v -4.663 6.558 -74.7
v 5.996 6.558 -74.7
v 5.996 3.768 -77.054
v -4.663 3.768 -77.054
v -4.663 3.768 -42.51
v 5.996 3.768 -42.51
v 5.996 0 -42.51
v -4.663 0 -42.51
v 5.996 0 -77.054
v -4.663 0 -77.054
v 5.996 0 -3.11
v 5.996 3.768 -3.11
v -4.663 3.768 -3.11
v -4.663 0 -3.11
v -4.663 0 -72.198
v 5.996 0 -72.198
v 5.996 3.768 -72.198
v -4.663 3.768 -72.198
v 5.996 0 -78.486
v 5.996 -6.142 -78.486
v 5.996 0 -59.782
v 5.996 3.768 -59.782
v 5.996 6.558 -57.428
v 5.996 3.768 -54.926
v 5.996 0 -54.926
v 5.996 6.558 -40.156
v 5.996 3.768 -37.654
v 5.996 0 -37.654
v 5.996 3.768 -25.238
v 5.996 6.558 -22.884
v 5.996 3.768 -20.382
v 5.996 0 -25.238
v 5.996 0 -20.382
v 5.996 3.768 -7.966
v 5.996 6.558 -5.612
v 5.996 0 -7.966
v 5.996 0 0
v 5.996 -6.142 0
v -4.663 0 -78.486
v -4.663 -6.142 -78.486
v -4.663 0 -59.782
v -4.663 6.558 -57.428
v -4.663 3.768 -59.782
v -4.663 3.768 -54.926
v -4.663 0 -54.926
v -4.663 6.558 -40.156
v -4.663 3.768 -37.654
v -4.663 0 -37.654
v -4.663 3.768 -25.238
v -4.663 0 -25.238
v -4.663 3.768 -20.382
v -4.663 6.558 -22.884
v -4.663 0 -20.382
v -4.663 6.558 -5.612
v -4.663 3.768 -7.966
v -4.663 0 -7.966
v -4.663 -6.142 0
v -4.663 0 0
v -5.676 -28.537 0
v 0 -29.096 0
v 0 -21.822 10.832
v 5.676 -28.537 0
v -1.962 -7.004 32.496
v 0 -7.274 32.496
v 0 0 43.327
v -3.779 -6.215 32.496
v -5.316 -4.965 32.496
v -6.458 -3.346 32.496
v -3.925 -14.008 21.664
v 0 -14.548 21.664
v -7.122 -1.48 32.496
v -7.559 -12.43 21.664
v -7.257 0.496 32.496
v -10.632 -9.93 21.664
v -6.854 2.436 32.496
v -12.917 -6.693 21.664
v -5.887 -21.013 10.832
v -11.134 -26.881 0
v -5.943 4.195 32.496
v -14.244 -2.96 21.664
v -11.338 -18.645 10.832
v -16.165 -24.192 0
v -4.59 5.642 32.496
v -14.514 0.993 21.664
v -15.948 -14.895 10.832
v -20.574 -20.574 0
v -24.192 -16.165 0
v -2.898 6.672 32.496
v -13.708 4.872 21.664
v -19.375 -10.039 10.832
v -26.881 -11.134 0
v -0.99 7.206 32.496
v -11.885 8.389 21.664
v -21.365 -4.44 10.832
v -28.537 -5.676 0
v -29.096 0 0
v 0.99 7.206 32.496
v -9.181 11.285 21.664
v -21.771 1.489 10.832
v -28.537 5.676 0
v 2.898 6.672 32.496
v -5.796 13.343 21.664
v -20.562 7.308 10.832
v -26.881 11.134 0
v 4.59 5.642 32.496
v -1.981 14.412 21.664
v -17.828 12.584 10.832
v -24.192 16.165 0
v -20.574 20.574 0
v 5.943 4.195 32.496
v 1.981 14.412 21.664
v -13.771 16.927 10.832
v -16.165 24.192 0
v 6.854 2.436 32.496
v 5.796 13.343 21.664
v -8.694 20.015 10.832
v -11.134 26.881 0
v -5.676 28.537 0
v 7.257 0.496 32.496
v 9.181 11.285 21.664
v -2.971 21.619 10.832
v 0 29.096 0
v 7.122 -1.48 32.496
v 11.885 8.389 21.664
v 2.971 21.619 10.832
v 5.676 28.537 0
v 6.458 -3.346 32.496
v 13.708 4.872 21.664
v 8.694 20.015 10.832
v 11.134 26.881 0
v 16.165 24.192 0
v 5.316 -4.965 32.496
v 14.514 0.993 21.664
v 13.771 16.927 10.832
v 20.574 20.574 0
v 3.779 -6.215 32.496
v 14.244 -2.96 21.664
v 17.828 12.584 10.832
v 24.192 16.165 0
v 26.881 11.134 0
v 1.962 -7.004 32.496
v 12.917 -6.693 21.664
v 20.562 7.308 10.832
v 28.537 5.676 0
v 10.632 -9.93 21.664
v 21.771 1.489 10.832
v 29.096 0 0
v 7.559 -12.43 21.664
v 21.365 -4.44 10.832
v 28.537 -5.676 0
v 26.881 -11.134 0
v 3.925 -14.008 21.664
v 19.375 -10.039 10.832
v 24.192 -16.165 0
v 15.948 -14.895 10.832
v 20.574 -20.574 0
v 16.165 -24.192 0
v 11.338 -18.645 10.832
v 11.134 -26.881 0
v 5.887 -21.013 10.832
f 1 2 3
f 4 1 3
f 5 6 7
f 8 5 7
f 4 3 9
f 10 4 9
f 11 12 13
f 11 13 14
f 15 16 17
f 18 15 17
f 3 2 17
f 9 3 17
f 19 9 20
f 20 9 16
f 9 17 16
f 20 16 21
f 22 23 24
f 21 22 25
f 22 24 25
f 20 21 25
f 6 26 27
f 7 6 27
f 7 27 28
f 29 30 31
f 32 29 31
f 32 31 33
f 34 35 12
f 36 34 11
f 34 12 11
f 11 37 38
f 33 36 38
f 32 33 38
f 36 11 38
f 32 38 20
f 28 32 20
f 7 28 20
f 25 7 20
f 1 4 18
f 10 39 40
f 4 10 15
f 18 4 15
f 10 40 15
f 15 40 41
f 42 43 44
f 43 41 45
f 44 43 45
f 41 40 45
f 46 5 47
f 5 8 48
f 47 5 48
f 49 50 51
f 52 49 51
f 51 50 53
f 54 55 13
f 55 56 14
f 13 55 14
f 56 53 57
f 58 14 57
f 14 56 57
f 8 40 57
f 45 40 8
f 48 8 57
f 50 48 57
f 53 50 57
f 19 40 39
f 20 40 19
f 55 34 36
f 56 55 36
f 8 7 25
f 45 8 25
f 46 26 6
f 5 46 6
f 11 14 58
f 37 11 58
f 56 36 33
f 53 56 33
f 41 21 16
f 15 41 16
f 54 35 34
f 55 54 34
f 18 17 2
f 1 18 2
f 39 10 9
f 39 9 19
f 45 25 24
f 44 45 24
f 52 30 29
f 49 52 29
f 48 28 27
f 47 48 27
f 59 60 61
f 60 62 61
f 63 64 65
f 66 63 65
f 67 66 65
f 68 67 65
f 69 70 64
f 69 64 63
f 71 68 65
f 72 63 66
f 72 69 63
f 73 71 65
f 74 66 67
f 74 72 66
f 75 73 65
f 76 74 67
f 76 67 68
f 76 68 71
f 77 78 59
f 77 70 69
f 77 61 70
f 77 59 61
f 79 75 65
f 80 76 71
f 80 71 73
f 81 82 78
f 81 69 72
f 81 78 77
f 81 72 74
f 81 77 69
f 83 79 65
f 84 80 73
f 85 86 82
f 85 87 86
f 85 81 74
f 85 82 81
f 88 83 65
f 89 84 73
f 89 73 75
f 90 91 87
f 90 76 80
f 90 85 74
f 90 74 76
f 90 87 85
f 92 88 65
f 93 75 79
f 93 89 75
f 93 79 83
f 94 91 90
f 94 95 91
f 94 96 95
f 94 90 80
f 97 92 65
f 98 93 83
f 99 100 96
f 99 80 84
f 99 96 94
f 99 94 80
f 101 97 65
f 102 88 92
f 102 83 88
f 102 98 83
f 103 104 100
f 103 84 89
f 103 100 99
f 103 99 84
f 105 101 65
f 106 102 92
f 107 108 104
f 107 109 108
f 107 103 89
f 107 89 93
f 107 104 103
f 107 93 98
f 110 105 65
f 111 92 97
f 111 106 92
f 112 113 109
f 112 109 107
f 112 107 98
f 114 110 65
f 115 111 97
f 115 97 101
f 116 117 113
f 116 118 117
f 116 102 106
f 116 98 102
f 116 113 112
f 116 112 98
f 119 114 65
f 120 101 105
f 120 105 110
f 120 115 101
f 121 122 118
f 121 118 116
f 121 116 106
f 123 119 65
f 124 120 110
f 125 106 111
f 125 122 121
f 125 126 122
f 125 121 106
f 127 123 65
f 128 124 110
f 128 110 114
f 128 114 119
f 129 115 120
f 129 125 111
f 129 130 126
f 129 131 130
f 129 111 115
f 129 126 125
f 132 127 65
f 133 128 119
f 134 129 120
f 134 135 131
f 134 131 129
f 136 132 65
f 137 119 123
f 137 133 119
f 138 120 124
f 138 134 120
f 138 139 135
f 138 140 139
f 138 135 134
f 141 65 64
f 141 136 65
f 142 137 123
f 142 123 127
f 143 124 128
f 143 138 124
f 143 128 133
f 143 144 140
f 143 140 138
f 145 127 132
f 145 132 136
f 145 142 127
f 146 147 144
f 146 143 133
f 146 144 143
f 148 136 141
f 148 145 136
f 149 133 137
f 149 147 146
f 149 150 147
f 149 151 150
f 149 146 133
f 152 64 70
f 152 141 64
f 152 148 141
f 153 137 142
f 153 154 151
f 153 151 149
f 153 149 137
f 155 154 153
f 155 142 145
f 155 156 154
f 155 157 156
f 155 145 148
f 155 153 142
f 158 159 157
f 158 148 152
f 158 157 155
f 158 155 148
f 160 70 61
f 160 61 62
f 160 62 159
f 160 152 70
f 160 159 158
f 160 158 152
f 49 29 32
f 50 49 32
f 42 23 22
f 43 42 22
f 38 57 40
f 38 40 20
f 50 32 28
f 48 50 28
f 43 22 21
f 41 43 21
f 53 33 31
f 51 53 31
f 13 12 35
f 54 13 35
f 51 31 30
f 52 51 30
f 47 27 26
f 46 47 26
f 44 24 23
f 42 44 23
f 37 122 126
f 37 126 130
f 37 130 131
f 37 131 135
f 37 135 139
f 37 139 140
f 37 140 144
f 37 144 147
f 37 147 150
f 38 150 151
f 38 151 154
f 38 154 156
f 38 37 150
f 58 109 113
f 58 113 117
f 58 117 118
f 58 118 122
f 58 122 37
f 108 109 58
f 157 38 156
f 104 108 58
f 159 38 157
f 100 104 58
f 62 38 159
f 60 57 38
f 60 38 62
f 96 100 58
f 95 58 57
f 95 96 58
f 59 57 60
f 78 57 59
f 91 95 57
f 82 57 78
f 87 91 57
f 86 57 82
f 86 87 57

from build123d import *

# Parameters (mm, degrees)
F3_W      = 12.7
F3_H      = 12.7
F4_DEPTH  = 78.486
F6_DEPTH  = 56.134
F8_DEPTH  = 25.4
F10_DEPTH = 25.4


# Not quite as in the source:
# - a feature names something its author has since deleted; it is built from what else it names


with BuildPart() as f1:
    # F0 (on Right) → F1 (revolve)
    with BuildSketch(Plane.YZ):
        Polygon((0, 43.3274172246), (-29.0957745165, 0), (0, 0), align=None)
    revolve(axis=Axis((0, 0, 21.6637086123), (0, 0, -1)))

    # F3 (on face) → F4 (join)
    with BuildSketch(Plane(origin=(0, 0, 0), x_dir=(1, 0, 0), z_dir=(0, 0, -1))):
        with Locations((-0.3540940419, -0.2081472591)):
            Rectangle(F3_W, F3_H)
    extrude(amount=F4_DEPTH)

    # F5 (on face) → F6 (join)
    with BuildSketch(Plane.YZ.offset(5.9959059581)):
        Polygon((0, -7.9661617056), (0, -3.1097470783), (0, 0), (-6.1418527409, 0), (-6.1418527409, -78.486), (0, -78.486), (0, -77.0541617056), (0, -72.1977470783), (0, -59.7821617056), (0, -54.9257470783), (0, -42.5101617056), (0, -37.6537470783), (0, -25.2381617056), (0, -20.3817470783), align=None)
        Polygon((3.7682792172, -3.1097470783), (0, -3.1097470783), (0, -7.9661617056), (3.7682792172, -7.9661617056), (6.5581472591, -5.6115360931), align=None)
        Polygon((3.7682792172, -20.3817470783), (0, -20.3817470783), (0, -25.2381617056), (3.7682792172, -25.2381617056), (6.5581472591, -22.8835360931), align=None)
        Polygon((3.7682792172, -42.5101617056), (6.5581472591, -40.1555360931), (3.7682792172, -37.6537470783), (0, -37.6537470783), (0, -42.5101617056), align=None)
        Polygon((3.7682792172, -59.7821617056), (6.5581472591, -57.4275360931), (3.7682792172, -54.9257470783), (0, -54.9257470783), (0, -59.7821617056), align=None)
        Polygon((0, -72.1977470783), (0, -77.0541617056), (3.7682792172, -77.0541617056), (6.5581472591, -74.6995360931), (3.7682792172, -72.1977470783), align=None)
    extrude(amount=-F6_DEPTH)

    # F5 (on face) → F8 (cut)
    with BuildSketch(Plane.YZ.offset(5.9959059581)):
        Polygon((0, 0), (0, -3.1097470783), (3.7682792172, -3.1097470783), (6.5581472591, -5.6115360931), (6.5581472591, 0), align=None)
        Polygon((3.7682792172, -7.9661617056), (0, -7.9661617056), (0, -20.3817470783), (3.7682792172, -20.3817470783), (6.5581472591, -22.8835360931), (6.5581472591, -5.6115360931), align=None)
        Polygon((6.5581472591, -40.1555360931), (6.5581472591, -22.8835360931), (3.7682792172, -25.2381617056), (0, -25.2381617056), (0, -37.6537470783), (3.7682792172, -37.6537470783), align=None)
        Polygon((6.5581472591, -57.4275360931), (6.5581472591, -40.1555360931), (3.7682792172, -42.5101617056), (0, -42.5101617056), (0, -54.9257470783), (3.7682792172, -54.9257470783), align=None)
        Polygon((6.5581472591, -74.6995360931), (6.5581472591, -57.4275360931), (3.7682792172, -59.7821617056), (0, -59.7821617056), (0, -72.1977470783), (3.7682792172, -72.1977470783), align=None)
        Polygon((0, -77.0541617056), (0, -78.486), (6.5581472591, -78.486), (6.5581472591, -74.6995360931), (3.7682792172, -77.0541617056), align=None)
    extrude(amount=-F8_DEPTH, mode=Mode.SUBTRACT)

    # F9 (on face) → F10 (cut)
    with BuildSketch(Plane.XZ.offset(6.1418527409)):
        Polygon((-4.6626133844, -78.486), (-4.6626133844, 0), (-28.4401431013, 0), (-50.1380940419, 0), (-50.1380940419, -78.486), align=None)
    extrude(amount=-F10_DEPTH, mode=Mode.SUBTRACT)


with BuildPart() as f2:
    # F0 (on Right) → F2 (revolve)
    with BuildSketch(Plane.YZ):
        Polygon((122.2083866596, 0), (151.3041611761, 0), (122.2083866596, 43.3274172246), align=None)
    revolve(axis=Axis((0, 122.2083866596, 21.6637086123), (0, 0, -1)))


solid = f1.part
